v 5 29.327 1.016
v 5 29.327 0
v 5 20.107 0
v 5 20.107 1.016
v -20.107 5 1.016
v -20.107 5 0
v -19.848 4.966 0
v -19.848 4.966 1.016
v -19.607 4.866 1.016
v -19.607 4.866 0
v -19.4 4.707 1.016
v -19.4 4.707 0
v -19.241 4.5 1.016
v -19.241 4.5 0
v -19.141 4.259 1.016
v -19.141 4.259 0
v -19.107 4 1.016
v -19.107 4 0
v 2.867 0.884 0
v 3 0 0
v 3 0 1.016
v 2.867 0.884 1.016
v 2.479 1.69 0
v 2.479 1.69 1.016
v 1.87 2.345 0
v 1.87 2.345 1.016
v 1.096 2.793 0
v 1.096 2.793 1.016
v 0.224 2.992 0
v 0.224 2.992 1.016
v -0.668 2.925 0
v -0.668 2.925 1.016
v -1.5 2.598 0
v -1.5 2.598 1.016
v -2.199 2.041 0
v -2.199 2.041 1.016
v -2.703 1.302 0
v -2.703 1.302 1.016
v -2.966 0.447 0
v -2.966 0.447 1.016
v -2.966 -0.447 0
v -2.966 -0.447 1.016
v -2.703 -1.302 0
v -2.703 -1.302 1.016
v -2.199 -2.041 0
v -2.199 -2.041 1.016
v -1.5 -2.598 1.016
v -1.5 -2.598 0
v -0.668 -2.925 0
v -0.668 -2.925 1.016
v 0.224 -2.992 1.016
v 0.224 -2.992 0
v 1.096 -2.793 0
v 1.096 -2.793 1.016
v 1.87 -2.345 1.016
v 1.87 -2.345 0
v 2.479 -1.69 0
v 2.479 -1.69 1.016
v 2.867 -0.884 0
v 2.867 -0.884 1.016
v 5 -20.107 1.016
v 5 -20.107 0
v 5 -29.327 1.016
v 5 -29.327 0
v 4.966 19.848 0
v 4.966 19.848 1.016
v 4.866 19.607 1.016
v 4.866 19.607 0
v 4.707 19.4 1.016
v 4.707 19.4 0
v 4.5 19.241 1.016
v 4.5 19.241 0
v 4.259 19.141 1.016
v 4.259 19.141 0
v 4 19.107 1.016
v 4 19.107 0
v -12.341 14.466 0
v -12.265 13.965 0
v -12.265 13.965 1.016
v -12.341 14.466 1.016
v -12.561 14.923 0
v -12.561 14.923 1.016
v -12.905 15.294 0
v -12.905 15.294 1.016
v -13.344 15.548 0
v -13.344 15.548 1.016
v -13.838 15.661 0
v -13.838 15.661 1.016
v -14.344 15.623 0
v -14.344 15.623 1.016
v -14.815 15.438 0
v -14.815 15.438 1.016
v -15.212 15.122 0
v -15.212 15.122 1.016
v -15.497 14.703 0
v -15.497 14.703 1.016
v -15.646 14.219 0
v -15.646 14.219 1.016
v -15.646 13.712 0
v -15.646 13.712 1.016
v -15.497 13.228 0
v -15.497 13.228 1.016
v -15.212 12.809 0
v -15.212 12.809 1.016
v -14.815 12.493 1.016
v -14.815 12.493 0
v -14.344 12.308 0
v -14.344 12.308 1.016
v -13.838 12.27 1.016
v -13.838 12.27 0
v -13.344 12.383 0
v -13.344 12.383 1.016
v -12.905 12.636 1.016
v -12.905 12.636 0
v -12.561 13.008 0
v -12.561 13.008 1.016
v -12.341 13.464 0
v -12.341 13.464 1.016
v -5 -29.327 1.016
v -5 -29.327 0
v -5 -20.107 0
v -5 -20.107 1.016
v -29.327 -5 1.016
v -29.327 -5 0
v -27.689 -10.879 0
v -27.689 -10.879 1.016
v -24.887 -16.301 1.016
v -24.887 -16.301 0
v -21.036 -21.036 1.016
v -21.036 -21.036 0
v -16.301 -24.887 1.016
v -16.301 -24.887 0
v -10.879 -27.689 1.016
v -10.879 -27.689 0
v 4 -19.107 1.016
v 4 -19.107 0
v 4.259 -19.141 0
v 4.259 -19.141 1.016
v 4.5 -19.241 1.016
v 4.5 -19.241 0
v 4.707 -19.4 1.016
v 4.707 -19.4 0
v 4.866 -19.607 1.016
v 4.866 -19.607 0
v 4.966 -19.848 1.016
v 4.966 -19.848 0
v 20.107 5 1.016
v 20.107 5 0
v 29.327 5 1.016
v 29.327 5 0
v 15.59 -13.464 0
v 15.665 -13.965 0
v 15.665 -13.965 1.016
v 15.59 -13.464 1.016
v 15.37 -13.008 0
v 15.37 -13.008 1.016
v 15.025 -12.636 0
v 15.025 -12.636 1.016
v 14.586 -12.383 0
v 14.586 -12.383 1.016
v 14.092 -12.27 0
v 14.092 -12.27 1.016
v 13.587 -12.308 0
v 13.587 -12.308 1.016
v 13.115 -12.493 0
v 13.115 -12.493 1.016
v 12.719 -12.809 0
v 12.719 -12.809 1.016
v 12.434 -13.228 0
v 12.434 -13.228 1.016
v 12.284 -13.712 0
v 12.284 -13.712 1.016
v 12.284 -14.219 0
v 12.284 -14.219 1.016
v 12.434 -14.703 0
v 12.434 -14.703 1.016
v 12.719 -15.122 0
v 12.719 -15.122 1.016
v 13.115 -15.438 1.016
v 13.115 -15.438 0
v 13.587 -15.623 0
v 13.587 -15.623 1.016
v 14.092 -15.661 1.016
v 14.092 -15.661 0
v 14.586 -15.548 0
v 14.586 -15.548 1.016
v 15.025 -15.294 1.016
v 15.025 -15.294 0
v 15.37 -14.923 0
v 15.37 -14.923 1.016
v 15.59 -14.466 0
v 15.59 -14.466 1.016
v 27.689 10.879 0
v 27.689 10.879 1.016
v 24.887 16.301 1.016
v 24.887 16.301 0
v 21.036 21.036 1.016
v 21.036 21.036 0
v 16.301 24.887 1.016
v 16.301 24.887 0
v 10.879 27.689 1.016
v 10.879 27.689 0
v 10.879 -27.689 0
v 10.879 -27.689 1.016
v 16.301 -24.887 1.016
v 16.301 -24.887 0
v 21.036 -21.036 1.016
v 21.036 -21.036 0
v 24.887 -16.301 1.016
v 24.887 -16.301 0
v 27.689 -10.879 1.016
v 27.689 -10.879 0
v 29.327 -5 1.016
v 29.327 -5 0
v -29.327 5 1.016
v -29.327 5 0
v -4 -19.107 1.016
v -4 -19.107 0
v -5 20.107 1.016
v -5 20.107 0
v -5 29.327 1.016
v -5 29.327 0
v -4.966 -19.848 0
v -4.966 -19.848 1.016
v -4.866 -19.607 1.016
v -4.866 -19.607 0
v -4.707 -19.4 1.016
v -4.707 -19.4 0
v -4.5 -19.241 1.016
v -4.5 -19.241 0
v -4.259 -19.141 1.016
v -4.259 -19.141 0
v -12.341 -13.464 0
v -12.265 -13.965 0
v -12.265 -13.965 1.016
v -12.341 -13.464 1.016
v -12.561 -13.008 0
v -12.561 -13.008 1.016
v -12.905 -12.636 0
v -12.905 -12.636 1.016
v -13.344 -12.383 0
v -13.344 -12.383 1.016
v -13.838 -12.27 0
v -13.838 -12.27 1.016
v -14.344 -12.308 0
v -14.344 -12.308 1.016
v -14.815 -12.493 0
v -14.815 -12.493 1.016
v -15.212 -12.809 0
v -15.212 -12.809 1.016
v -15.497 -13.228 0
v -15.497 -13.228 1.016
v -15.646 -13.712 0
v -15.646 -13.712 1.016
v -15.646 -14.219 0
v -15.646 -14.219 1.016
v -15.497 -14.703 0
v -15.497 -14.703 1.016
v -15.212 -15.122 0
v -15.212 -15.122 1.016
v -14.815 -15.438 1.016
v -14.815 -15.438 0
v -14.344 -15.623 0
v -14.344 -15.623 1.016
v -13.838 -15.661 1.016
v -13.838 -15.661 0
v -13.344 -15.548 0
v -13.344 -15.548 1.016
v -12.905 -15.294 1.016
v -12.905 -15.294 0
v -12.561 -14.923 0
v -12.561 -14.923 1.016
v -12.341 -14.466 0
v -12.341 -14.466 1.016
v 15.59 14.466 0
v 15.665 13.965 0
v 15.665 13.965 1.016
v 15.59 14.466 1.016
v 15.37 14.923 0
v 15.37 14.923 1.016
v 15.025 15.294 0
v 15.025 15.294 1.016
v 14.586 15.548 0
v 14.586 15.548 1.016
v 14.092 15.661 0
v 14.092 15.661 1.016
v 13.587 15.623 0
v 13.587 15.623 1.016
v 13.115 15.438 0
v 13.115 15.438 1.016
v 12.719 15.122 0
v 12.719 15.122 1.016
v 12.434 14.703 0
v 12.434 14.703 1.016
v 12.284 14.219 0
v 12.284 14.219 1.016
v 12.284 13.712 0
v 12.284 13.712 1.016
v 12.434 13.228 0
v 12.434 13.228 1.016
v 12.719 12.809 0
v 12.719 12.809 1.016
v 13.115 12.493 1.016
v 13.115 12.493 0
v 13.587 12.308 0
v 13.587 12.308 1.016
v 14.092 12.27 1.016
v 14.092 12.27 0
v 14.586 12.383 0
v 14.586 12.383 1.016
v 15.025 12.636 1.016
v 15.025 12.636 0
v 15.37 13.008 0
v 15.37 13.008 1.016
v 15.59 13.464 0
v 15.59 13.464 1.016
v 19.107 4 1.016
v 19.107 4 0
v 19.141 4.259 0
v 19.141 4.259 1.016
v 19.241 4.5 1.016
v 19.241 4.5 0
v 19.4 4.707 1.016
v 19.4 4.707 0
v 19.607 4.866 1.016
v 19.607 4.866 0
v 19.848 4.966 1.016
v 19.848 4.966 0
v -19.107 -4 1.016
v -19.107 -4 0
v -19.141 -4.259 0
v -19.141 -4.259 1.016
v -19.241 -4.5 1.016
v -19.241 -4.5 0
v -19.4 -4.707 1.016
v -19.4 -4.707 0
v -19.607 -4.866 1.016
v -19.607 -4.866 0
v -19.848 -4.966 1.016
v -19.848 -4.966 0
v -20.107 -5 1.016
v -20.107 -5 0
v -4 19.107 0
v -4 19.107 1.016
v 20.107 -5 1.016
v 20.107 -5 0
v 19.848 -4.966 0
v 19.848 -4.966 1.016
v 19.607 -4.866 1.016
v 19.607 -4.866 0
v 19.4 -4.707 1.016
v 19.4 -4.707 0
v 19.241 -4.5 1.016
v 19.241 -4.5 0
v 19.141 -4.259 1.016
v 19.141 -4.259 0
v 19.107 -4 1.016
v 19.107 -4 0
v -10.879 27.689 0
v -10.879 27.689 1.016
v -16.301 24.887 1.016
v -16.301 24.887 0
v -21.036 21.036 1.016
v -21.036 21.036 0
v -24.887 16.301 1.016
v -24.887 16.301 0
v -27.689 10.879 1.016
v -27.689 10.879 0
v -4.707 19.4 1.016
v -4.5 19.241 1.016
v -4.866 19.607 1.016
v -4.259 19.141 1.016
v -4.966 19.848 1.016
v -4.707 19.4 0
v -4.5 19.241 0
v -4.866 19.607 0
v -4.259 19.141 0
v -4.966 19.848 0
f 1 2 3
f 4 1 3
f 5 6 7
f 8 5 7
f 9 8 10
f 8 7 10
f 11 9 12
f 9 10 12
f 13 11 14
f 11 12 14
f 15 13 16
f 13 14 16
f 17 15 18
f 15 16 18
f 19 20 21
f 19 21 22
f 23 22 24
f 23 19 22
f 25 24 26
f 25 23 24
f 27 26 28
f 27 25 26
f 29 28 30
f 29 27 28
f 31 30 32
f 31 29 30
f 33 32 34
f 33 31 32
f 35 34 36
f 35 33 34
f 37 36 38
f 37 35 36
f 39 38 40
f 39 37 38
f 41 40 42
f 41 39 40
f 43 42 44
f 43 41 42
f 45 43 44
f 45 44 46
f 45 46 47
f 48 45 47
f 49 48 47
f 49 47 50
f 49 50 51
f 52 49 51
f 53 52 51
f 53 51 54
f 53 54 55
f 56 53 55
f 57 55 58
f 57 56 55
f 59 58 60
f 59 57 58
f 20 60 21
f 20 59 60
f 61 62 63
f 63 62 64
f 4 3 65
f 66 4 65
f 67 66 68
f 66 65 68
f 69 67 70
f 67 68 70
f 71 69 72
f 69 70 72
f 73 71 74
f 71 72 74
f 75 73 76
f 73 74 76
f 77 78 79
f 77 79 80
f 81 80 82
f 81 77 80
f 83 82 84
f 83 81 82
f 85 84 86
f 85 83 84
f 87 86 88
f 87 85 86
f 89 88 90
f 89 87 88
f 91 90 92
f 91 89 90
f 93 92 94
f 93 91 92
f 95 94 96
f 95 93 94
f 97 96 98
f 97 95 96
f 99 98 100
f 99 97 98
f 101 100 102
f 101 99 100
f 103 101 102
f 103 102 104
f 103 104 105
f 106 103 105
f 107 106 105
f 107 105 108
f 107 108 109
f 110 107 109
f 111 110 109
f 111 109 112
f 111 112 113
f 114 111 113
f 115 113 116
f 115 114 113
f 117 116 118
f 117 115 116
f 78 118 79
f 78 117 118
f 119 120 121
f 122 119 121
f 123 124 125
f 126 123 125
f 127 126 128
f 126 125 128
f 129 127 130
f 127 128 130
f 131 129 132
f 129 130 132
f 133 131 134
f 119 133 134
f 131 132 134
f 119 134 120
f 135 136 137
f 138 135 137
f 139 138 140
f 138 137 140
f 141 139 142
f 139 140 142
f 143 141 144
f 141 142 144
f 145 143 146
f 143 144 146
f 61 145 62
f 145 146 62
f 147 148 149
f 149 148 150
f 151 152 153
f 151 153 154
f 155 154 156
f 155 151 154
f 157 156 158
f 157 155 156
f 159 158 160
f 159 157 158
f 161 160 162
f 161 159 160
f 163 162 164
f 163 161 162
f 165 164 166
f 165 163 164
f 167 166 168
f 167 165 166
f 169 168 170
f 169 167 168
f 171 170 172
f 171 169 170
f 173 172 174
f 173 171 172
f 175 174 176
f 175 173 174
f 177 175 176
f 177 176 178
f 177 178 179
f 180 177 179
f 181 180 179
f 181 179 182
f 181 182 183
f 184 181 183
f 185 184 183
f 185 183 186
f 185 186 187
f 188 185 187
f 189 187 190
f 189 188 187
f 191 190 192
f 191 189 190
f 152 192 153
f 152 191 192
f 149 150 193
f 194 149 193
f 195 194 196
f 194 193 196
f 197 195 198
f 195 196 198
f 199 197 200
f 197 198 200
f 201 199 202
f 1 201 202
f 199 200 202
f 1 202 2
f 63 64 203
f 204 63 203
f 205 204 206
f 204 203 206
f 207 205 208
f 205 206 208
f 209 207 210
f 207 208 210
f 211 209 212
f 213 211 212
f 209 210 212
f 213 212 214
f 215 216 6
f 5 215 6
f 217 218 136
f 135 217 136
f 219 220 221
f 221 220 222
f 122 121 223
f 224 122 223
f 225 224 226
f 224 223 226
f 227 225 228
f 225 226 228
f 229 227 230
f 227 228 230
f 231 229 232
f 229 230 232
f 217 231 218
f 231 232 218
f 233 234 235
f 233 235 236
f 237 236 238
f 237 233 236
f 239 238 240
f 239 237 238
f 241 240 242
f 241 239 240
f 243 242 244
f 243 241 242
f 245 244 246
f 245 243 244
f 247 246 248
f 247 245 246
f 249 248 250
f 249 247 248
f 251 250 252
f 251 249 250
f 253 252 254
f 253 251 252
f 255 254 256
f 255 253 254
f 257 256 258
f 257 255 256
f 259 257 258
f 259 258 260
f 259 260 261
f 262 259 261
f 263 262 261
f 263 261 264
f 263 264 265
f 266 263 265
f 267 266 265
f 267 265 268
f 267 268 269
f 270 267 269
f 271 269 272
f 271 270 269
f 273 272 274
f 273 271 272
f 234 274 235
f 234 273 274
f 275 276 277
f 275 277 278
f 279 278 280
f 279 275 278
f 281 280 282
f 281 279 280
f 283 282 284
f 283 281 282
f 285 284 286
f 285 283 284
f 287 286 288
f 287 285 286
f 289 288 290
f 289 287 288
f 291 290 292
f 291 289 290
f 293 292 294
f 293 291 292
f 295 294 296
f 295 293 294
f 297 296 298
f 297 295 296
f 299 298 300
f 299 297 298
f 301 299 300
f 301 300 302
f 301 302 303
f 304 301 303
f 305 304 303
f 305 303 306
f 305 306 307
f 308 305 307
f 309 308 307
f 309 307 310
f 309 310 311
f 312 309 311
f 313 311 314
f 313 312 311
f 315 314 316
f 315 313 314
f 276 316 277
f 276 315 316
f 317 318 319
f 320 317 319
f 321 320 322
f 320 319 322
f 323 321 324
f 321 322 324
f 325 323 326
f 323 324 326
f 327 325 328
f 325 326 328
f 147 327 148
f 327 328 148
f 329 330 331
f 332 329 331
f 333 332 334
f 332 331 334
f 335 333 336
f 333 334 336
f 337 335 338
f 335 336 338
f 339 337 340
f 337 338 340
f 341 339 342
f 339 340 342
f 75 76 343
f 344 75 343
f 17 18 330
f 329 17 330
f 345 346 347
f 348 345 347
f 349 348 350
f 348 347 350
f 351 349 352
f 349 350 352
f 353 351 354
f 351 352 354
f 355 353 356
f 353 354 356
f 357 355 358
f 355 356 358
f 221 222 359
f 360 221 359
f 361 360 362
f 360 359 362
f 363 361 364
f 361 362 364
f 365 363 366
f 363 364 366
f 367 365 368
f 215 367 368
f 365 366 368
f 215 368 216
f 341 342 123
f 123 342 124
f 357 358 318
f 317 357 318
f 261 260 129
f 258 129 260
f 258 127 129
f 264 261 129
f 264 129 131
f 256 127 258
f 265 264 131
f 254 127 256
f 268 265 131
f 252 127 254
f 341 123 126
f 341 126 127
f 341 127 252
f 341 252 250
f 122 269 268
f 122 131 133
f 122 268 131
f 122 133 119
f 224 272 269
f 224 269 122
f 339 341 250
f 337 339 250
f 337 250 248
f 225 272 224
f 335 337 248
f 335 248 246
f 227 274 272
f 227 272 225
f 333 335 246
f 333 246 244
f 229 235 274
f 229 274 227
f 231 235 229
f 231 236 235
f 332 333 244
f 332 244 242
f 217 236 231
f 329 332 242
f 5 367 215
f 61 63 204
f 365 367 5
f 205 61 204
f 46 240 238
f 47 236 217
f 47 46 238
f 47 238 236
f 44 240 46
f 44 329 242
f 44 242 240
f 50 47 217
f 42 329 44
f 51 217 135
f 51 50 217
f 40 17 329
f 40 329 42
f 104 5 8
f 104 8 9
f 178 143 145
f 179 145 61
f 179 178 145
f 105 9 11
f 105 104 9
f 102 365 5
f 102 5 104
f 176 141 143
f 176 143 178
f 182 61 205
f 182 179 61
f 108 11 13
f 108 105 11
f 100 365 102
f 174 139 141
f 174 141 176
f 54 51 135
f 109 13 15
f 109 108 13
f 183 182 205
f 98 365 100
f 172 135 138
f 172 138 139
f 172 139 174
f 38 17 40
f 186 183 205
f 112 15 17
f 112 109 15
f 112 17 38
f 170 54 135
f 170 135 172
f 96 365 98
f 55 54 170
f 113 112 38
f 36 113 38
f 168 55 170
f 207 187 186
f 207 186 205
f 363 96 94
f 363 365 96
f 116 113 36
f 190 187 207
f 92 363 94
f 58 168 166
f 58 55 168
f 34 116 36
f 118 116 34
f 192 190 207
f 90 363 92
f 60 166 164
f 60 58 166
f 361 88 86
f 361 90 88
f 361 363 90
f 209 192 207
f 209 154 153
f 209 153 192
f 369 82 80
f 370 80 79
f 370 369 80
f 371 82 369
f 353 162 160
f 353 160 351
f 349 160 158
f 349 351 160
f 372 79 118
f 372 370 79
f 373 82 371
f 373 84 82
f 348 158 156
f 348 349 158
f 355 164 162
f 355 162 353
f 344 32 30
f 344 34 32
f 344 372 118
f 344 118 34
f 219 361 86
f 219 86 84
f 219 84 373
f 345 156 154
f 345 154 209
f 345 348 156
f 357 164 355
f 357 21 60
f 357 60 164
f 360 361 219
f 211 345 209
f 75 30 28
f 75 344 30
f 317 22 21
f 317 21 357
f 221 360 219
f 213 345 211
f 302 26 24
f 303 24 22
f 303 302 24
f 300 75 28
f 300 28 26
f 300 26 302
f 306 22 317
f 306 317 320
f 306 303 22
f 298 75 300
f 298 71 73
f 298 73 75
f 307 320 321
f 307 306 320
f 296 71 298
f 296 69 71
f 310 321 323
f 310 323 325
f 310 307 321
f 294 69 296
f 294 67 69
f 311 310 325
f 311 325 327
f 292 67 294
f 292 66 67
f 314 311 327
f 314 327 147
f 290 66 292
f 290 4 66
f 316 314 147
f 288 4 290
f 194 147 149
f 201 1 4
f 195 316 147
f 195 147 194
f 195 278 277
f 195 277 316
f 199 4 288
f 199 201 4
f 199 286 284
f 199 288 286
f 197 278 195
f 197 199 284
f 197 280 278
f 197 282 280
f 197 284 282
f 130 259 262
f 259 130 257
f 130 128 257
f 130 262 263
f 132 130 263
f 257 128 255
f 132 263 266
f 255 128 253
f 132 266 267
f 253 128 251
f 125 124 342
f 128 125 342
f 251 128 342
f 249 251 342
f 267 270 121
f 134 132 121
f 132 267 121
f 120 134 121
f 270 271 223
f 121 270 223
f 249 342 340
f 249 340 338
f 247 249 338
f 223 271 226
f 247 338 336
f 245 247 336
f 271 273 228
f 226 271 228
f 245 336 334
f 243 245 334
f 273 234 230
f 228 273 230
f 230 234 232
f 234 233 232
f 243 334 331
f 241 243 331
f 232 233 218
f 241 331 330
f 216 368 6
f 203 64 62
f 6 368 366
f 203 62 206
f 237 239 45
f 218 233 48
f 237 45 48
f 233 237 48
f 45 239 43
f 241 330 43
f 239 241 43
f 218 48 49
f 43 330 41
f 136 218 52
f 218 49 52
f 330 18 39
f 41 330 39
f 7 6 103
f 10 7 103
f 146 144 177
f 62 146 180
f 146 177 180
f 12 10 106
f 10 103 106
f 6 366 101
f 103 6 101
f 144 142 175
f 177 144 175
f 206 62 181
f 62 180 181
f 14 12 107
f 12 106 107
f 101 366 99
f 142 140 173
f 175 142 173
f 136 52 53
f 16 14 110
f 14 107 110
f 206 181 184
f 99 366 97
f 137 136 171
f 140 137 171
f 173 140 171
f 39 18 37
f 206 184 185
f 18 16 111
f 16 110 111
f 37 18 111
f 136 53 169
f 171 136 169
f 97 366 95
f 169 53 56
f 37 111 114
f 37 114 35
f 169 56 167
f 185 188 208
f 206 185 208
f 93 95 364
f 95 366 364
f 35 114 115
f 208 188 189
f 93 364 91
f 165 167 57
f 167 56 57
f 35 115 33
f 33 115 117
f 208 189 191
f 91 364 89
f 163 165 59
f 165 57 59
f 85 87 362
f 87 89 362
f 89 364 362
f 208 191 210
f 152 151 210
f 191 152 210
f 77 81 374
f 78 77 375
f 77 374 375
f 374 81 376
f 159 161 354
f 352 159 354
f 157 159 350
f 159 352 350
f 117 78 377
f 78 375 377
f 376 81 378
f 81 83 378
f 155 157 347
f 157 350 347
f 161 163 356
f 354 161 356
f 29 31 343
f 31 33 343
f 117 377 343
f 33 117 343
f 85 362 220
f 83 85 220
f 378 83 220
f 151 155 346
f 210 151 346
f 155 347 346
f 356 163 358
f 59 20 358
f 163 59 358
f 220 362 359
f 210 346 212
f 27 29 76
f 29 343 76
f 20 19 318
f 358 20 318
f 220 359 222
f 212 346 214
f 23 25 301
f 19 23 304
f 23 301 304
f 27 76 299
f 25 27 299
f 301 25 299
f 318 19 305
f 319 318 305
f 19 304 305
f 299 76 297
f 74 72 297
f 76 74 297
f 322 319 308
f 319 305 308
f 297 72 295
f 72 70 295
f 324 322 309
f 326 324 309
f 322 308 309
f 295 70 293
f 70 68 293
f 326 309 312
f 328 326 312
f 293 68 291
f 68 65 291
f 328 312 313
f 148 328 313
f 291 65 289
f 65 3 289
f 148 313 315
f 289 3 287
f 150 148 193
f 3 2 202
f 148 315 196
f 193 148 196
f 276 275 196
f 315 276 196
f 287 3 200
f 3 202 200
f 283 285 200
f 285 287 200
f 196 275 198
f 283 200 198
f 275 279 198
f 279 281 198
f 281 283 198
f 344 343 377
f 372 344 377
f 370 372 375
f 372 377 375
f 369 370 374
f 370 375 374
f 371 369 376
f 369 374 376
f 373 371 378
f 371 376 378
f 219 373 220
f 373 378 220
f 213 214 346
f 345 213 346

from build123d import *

# Parameters (mm, degrees)
SKETCH1_R           = 1.7
SKETCH1_R_2         = 3
BOSS_EXTRUDE1_DEPTH = 1.016


with BuildPart() as part:
    # Sketch1 → Boss-Extrude1 (new body)
    with BuildSketch(Plane.XY):
        with BuildLine():
            Line((-29.326822194, 5), (-20.106608804, 5))
            ThreePointArc((-20.106608804, 5), (-19.399502023, 4.707106781), (-19.106608804, 4))
            Line((-19.106608804, 4), (-19.106608804, -4))
            ThreePointArc((-19.106608804, -4), (-19.399502023, -4.707106781), (-20.106608804, -5))
            Line((-20.106608804, -5), (-29.326822194, -5))
            ThreePointArc((-29.326822194, -5), (-21.03642674, -21.03642674), (-5, -29.326822194))
            Line((-5, -29.326822194), (-5, -20.106608804))
            ThreePointArc((-5, -20.106608804), (-4.707106781, -19.399502023), (-4, -19.106608804))
            Line((-4, -19.106608804), (4, -19.106608804))
            ThreePointArc((4, -19.106608804), (4.707106781, -19.399502023), (5, -20.106608804))
            Line((5, -20.106608804), (5, -29.326822194))
            ThreePointArc((5, -29.326822194), (21.03642674, -21.03642674), (29.326822194, -5))
            Line((29.326822194, -5), (20.106608804, -5))
            ThreePointArc((20.106608804, -5), (19.399502023, -4.707106781), (19.106608804, -4))
            Line((19.106608804, -4), (19.106608804, 4))
            ThreePointArc((19.106608804, 4), (19.399502023, 4.707106781), (20.106608804, 5))
            Line((20.106608804, 5), (29.326822194, 5))
            ThreePointArc((29.326822194, 5), (21.03642674, 21.03642674), (5, 29.326822194))
            Line((5, 29.326822194), (5, 20.106608804))
            ThreePointArc((5, 20.106608804), (4.707106781, 19.399502023), (4, 19.106608804))
            Line((4, 19.106608804), (-4, 19.106608804))
            ThreePointArc((-4, 19.106608804), (-4.707106781, 19.399502023), (-5, 20.106608804))
            Line((-5, 20.106608804), (-5, 29.326822194))
            ThreePointArc((-5, 29.326822194), (-21.03642674, 21.03642674), (-29.326822194, 5))
        make_face()
        with Locations((13.965358928, 13.965358928)):
            Circle(SKETCH1_R, mode=Mode.SUBTRACT)
        with Locations((13.965358928, -13.965358928)):
            Circle(SKETCH1_R, mode=Mode.SUBTRACT)
        with Locations((-13.965358928, -13.965358928)):
            Circle(SKETCH1_R, mode=Mode.SUBTRACT)
        with Locations((-13.965358928, 13.965358928)):
            Circle(SKETCH1_R, mode=Mode.SUBTRACT)
        Circle(SKETCH1_R_2, mode=Mode.SUBTRACT)
    extrude(amount=BOSS_EXTRUDE1_DEPTH)


solid = part.part
